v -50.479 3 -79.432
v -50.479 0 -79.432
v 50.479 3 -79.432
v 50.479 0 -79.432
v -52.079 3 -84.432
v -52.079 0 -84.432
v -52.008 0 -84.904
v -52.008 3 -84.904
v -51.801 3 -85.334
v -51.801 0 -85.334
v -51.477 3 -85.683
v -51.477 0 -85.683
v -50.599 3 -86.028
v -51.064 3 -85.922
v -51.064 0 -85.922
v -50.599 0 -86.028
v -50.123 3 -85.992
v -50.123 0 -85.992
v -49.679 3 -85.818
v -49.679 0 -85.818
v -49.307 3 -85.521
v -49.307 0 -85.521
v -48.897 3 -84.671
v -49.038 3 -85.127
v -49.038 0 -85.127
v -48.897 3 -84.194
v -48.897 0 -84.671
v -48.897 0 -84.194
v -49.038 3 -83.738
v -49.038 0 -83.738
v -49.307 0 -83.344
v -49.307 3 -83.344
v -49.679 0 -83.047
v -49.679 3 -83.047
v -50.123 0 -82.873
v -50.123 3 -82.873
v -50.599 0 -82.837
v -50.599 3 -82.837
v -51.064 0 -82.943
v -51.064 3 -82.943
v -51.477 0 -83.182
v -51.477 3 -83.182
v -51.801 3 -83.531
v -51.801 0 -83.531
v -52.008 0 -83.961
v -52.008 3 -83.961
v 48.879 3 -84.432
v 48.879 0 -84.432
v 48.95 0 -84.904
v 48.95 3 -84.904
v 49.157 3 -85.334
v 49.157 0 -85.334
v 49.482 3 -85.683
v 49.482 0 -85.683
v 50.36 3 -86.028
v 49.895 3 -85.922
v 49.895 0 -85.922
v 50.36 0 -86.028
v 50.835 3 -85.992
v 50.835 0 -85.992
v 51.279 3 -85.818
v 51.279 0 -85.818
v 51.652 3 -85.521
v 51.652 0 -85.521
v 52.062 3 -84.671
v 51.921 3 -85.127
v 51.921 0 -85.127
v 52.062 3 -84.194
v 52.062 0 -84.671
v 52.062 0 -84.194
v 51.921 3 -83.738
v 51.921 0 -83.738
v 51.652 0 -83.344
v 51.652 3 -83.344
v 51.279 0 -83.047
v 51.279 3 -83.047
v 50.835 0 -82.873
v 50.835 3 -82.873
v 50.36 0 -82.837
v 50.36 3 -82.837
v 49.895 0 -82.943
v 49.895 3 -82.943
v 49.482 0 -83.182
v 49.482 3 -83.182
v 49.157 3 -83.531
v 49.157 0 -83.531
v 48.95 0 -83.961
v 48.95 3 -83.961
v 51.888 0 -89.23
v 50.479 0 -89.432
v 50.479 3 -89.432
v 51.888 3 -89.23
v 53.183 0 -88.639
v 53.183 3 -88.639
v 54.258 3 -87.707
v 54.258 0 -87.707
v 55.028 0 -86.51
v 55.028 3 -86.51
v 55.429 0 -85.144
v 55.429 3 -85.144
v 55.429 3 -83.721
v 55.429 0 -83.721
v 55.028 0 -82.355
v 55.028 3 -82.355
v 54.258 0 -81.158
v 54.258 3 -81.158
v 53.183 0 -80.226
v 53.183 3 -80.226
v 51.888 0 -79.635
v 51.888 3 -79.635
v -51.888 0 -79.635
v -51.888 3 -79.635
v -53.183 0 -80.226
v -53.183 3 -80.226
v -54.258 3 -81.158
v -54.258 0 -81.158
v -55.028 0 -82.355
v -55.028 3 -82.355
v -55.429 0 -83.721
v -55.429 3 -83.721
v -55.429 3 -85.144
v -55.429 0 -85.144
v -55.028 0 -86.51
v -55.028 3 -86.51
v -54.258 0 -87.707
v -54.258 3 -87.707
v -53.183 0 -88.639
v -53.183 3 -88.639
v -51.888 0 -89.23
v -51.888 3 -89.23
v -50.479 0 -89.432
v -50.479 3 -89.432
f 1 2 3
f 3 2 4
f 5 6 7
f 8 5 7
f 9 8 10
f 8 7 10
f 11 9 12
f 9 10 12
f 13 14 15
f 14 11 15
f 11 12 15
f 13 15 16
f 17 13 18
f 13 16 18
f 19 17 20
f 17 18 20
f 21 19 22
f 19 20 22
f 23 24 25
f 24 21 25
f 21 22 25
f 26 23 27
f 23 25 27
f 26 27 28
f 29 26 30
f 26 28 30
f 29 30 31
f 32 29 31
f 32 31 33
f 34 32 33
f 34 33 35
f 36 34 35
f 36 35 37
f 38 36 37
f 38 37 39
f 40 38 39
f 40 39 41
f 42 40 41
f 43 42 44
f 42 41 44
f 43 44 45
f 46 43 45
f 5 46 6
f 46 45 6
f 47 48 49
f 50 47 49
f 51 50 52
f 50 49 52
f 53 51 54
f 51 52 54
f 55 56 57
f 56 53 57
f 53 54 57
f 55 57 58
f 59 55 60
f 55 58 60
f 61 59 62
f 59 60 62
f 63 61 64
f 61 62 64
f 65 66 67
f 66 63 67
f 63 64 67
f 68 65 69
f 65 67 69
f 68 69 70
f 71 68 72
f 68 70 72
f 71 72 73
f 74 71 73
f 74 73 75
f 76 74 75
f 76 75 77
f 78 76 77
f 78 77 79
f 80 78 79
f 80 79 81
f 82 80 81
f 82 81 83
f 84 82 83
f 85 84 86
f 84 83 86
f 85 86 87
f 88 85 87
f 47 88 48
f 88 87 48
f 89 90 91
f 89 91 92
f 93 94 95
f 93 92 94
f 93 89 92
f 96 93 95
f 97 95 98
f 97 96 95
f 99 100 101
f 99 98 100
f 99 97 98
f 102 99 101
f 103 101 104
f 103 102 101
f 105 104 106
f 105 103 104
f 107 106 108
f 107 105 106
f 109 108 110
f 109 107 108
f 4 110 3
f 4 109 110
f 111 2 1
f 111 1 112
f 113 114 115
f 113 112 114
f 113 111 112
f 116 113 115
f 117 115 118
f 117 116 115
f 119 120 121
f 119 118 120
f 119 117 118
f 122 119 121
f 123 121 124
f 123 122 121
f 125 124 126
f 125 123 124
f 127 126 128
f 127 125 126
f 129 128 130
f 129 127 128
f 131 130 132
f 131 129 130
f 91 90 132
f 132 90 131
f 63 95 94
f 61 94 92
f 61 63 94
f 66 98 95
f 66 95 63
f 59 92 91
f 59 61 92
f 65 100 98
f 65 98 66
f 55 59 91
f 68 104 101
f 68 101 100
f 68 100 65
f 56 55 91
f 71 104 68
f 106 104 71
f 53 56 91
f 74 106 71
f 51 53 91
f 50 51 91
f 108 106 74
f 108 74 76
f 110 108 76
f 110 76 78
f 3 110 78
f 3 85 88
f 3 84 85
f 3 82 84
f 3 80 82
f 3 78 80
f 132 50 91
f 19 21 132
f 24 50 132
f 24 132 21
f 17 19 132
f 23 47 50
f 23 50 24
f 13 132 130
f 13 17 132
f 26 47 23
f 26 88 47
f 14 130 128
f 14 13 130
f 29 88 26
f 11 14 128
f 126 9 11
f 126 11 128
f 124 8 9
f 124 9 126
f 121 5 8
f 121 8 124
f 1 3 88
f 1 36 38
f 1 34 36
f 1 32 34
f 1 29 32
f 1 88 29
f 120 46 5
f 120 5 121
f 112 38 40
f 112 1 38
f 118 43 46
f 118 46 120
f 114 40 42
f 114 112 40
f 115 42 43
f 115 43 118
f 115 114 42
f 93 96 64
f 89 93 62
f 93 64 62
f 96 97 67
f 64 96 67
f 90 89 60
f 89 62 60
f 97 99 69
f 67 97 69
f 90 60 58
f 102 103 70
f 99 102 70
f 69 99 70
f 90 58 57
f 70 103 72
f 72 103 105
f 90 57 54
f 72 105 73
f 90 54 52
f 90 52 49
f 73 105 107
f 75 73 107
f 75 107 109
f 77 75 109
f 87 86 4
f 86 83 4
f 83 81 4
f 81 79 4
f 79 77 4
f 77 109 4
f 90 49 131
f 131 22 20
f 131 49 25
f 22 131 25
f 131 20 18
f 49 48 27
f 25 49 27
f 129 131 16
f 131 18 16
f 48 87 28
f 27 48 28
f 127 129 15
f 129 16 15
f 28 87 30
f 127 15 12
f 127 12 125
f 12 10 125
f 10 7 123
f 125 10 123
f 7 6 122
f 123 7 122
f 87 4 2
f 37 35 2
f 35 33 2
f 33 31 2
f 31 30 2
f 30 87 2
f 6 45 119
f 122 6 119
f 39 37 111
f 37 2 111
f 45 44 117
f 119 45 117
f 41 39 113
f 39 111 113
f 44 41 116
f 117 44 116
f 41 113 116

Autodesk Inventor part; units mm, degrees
ref_plane "YZ Plane" through (0, 0, 0) normal (1, 0, 0) x (0, 1, 0)
ref_plane "XZ Plane" through (0, 0, 0) normal (0, 1, 0) x (-1, 0, 0)
ref_plane "XY Plane" through (0, 0, 0) normal (0, 0, 1) x (1, 0, 0)
sketch "Sketch1" plane through (0, 0, 0) normal (0, 1, 0) x (-1, 0, 0)
  circle A0 centre (50.4794, -84.4325) radius 1.6
  circle A1 centre (-50.4794, -84.4325) radius 1.6
  arc A2 (50.4794, -89.4325) -> (50.4794, -79.4325) centre (50.4794, -84.4325) ccw
  arc A3 (-50.4794, -79.4325) -> (-50.4794, -89.4325) centre (-50.4794, -84.4325) ccw
  line L0 (50.4794, -79.4325) -> (-50.4794, -79.4325)
  line L1 (-50.4794, -89.4325) -> (50.4794, -89.4325)
  point P0 (0, 0)
  dimension "d0" = 3.2
  dimension "d1" = 3.2
  dimension "d2" = 5
  dimension "d3" = 5
extrude "Extrusion1" add sketch "Sketch1" along normal blind 3
properties part number "Front guard"
